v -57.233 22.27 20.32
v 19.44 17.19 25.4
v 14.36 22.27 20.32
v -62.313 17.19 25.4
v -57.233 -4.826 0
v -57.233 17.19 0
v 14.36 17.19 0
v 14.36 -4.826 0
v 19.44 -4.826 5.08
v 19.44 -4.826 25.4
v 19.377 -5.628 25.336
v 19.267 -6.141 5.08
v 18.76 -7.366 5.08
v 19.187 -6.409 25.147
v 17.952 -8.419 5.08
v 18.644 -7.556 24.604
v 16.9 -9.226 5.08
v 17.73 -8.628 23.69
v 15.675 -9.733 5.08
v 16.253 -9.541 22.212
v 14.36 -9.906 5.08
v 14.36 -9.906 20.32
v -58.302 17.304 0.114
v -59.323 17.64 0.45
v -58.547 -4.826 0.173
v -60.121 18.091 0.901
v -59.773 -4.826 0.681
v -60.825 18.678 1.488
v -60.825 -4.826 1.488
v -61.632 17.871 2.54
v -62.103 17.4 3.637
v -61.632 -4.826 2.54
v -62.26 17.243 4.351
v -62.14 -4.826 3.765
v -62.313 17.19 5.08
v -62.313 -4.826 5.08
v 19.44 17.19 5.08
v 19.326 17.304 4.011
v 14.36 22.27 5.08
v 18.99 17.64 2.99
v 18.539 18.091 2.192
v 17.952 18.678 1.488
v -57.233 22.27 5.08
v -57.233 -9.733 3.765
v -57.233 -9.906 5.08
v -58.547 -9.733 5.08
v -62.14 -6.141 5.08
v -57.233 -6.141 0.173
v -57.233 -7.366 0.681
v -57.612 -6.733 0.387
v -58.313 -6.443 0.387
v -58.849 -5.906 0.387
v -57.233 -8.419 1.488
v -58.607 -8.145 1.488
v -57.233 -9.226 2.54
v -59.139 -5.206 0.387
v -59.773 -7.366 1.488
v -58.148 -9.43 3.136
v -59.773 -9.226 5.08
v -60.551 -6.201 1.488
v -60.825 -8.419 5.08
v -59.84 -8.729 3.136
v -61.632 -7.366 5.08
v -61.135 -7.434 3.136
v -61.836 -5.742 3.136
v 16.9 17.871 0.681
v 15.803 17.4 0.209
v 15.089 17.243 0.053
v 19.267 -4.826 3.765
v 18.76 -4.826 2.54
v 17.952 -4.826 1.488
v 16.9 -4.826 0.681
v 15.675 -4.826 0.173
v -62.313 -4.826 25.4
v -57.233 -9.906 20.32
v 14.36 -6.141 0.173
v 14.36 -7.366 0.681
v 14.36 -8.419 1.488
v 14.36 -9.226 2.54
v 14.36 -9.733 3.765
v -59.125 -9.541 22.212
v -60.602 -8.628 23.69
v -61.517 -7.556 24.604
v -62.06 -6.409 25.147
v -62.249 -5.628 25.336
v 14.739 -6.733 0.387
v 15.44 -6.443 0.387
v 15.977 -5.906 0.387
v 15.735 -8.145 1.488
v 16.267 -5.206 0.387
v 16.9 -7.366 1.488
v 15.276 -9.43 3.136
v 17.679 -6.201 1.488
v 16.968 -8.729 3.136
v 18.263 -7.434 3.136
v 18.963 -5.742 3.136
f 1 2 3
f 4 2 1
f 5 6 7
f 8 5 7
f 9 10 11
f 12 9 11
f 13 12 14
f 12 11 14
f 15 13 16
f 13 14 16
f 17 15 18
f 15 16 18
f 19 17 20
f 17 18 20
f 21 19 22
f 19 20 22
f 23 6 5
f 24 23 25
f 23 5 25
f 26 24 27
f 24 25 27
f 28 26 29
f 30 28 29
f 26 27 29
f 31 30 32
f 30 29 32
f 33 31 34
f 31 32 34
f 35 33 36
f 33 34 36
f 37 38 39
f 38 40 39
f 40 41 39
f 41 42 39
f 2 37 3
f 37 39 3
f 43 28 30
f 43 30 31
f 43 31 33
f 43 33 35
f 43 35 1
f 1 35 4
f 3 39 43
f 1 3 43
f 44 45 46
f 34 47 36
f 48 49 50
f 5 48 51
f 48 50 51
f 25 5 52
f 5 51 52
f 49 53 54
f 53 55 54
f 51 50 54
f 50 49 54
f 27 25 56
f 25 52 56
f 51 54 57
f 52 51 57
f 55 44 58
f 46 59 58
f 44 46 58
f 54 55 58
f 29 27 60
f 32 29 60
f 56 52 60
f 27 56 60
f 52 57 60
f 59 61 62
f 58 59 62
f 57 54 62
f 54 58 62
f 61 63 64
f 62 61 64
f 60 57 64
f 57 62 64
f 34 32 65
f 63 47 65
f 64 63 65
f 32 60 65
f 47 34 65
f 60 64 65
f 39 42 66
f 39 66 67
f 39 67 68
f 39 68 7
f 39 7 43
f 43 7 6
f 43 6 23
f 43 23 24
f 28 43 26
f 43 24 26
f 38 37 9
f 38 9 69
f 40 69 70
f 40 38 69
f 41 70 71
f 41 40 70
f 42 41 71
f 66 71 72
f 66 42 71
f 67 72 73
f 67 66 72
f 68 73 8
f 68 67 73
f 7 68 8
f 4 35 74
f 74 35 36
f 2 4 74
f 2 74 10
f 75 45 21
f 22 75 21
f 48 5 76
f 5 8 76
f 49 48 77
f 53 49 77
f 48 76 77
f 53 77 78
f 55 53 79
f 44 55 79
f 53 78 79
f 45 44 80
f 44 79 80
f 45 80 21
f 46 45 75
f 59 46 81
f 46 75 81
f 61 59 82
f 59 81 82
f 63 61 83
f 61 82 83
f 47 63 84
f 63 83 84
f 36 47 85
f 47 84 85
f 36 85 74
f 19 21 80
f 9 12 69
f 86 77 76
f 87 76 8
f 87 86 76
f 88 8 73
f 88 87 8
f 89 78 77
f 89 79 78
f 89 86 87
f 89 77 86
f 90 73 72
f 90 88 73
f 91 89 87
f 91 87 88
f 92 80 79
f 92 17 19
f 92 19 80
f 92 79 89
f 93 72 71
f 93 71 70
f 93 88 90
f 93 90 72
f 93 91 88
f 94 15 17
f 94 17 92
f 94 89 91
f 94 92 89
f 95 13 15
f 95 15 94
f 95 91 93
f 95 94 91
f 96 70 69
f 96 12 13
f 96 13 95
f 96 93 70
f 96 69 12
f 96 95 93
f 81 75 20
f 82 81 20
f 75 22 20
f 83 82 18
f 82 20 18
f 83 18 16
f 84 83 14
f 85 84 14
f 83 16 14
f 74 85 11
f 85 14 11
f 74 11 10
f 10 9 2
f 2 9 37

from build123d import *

# Parameters (mm, degrees)
F1_DEPTH = 25.4
F2_SIZE  = 5.08
F3_R     = 5.08


with BuildPart() as f1:
    # F0 (on Top) → F1 (new body)
    with BuildSketch(Plane.XY):
        Polygon((19.4402, -9.906404), (19.4402, 22.270419), (-62.312644, 22.270419), (-62.312644, -9.906404), (-20.164922, -9.906404), align=None)
    extrude(amount=F1_DEPTH)

    # F2
    f2_edges = [f1.edges().sort_by_distance(p)[0] for p in [
        (19.4402, 22.270419, 12.7),
        (-62.312644, 22.270419, 12.7),
        (-21.436222, 22.270419, 0),
        (-21.436222, 22.270419, 25.4),
    ]]
    chamfer(f2_edges, length=F2_SIZE)

    # F3
    f3_edges = [f1.edges().sort_by_distance(p)[0] for p in [
        (-62.312644, -9.906404, 12.7),
        (-21.436222, -9.906404, 25.4),
        (19.4402, -9.906404, 12.7),
        (-21.436222, -9.906404, 0),
        (19.4402, 3.642007, 0),
        (-62.312644, 3.642007, 0),
    ]]
    fillet(f3_edges, radius=F3_R)


solid = f1.part
